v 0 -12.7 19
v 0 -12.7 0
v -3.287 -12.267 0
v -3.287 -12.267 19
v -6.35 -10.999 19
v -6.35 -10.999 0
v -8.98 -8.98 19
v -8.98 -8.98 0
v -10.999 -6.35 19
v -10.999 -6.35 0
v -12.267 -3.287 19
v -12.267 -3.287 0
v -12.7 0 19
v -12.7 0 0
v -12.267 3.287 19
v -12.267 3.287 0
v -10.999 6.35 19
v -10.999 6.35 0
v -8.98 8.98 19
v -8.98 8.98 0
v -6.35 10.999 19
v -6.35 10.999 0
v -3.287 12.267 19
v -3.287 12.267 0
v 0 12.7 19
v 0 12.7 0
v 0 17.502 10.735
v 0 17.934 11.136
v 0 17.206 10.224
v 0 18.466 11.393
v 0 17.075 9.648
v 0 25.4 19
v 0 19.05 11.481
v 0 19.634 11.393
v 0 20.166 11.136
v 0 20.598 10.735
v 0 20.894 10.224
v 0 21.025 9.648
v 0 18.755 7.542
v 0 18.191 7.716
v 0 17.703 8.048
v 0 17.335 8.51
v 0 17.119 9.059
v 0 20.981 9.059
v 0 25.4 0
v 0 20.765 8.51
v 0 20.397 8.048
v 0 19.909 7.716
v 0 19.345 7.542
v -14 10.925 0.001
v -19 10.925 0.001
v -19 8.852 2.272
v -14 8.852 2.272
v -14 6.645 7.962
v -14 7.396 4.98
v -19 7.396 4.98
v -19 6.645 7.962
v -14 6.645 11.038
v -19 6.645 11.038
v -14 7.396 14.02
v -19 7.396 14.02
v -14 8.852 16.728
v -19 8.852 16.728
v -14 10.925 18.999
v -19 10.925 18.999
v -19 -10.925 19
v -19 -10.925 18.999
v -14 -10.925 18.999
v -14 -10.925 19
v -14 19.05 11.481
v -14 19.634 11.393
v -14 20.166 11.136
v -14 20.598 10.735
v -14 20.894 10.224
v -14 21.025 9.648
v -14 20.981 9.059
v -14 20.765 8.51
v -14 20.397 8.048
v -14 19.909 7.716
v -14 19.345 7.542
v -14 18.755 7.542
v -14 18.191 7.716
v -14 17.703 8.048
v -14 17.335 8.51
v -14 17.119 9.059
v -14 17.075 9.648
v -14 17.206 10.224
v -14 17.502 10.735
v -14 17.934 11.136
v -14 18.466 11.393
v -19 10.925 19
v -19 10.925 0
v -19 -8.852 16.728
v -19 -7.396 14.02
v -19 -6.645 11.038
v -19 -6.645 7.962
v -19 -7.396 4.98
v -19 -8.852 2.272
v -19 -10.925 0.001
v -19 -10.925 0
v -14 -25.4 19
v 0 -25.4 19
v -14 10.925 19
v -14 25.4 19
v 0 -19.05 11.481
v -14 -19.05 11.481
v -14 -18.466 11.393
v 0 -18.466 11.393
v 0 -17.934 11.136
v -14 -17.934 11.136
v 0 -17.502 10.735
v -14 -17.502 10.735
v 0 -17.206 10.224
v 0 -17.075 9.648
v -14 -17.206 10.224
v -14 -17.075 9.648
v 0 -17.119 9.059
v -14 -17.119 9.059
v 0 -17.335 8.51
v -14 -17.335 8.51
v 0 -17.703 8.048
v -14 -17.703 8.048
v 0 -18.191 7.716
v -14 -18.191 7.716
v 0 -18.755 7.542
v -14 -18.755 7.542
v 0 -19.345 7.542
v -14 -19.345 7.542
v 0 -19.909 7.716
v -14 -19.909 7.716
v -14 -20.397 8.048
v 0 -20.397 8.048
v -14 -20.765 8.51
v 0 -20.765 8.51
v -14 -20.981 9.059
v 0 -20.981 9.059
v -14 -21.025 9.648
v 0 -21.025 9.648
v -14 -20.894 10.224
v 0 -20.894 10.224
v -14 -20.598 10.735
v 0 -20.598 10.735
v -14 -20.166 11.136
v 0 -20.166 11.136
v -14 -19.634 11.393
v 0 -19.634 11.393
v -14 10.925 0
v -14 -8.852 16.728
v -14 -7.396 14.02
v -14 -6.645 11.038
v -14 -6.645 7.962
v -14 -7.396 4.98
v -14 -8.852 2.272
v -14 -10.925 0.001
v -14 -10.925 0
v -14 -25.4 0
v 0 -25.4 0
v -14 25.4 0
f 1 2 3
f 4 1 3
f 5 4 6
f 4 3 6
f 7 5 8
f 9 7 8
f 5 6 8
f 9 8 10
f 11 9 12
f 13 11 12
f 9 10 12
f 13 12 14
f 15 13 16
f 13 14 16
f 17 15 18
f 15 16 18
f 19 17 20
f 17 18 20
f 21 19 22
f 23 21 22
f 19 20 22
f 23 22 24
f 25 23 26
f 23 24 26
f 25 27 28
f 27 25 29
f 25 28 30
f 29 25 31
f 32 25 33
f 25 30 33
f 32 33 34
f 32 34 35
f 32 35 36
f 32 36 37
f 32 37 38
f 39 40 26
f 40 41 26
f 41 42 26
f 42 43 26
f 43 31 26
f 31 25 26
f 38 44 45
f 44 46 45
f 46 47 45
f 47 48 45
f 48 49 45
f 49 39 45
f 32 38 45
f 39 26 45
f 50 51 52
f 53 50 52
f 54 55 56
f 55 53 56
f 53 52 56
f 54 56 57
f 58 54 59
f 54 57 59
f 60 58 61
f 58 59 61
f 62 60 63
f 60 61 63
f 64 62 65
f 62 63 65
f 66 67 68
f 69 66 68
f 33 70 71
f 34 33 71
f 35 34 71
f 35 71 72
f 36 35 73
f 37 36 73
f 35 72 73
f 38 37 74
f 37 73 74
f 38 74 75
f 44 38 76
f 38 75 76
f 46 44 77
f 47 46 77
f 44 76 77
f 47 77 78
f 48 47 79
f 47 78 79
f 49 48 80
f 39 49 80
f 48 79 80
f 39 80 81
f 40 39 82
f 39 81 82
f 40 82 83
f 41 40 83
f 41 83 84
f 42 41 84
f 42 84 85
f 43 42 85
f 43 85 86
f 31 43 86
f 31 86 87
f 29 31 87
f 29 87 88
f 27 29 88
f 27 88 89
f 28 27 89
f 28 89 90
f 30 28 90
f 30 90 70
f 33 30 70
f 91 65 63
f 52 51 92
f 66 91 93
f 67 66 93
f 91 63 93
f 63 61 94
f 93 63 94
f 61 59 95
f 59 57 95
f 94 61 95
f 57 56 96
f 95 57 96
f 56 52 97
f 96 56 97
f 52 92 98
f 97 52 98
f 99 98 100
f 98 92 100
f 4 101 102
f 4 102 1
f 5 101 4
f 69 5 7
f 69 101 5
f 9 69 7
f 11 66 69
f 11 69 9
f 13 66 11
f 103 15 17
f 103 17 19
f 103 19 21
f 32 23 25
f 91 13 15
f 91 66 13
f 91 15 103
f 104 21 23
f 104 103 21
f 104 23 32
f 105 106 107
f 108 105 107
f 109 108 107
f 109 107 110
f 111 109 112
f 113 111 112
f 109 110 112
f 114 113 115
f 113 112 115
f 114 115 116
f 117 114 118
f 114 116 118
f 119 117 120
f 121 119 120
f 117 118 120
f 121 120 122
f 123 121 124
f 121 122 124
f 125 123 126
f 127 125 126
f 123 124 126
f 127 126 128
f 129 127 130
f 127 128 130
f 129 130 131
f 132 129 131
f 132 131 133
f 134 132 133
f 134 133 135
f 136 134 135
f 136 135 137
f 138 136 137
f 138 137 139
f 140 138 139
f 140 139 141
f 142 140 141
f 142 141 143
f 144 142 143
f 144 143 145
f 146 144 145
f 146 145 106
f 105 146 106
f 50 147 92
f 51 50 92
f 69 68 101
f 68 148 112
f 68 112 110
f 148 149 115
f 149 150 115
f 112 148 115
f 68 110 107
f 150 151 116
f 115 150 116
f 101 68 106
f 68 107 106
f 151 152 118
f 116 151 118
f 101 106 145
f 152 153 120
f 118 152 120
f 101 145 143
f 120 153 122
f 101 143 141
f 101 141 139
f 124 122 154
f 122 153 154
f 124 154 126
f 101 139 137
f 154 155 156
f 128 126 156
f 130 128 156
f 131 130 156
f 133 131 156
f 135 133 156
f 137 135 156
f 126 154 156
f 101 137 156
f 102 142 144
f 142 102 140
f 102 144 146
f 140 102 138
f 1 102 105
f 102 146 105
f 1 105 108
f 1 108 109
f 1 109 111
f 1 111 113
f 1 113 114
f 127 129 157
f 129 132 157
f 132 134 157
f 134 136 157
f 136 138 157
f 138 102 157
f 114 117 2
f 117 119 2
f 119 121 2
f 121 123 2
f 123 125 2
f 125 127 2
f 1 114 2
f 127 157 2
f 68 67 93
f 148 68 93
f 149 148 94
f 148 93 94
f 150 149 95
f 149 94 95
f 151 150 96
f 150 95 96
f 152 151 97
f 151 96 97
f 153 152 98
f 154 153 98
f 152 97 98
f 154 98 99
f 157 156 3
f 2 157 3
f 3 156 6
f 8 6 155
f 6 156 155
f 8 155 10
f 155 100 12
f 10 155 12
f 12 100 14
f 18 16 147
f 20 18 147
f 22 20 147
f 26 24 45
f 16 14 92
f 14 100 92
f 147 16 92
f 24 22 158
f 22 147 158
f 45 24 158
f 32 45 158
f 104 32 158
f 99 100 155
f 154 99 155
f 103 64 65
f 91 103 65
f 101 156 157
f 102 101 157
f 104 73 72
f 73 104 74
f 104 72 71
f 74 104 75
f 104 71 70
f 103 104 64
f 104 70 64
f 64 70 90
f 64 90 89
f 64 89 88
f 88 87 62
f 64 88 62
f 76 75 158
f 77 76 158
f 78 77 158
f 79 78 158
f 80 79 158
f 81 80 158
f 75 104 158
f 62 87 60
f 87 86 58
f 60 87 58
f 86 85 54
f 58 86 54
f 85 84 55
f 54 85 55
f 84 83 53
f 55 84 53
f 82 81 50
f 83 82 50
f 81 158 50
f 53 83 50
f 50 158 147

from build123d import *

# Parameters (mm, degrees)
BOSS_EXTRUDE1_DEPTH = 19
SKETCH4_R           = 1.980568965
CUT_EXTRUDE1_DEPTH  = 35.672179049
SKETCH6_R           = 12.5
CUT_EXTRUDE2_DEPTH  = 5


with BuildPart() as part:
    # Sketch2 → Boss-Extrude1 (new body)
    with BuildSketch(Plane(origin=(0, 0, 0), x_dir=(0, 1, 0), z_dir=(0, 0, 1))):
        with BuildLine():
            Line((10.925, 19), (-10.925, 19))
            Line((-10.925, 19), (-10.925, 14))
            Line((-10.925, 14), (-25.4, 14))
            Line((-25.4, 14), (-25.4, 0))
            Line((-25.4, 0), (-12.7, 0))
            ThreePointArc((-12.7, 0), (0, 12.7), (12.7, 0))
            Line((12.7, 0), (25.4, 0))
            Line((25.4, 0), (25.4, 14))
            Line((25.4, 14), (10.925, 14))
            Line((10.925, 14), (10.925, 19))
        make_face()
    extrude(amount=BOSS_EXTRUDE1_DEPTH)

    # Sketch4 → Cut-Extrude1 (cut, through all)
    with BuildSketch(Plane.ZY.offset(14)):
        with Locations((9.5, 19.05)):
            Circle(SKETCH4_R)
        with Locations((9.5, -19.05)):
            Circle(SKETCH4_R)
    extrude(amount=-CUT_EXTRUDE1_DEPTH, mode=Mode.SUBTRACT)

    # Sketch6 → Cut-Extrude2 (cut)
    with BuildSketch(Plane(origin=(-19, 0, 0), x_dir=(0, -1, 0), z_dir=(-1, 0, 0))):
        with Locations((-19.05, 9.5)):
            Circle(SKETCH6_R)
        with Locations((19.05, 9.5)):
            Circle(SKETCH6_R)
    extrude(amount=-CUT_EXTRUDE2_DEPTH, mode=Mode.SUBTRACT)


solid = part.part
